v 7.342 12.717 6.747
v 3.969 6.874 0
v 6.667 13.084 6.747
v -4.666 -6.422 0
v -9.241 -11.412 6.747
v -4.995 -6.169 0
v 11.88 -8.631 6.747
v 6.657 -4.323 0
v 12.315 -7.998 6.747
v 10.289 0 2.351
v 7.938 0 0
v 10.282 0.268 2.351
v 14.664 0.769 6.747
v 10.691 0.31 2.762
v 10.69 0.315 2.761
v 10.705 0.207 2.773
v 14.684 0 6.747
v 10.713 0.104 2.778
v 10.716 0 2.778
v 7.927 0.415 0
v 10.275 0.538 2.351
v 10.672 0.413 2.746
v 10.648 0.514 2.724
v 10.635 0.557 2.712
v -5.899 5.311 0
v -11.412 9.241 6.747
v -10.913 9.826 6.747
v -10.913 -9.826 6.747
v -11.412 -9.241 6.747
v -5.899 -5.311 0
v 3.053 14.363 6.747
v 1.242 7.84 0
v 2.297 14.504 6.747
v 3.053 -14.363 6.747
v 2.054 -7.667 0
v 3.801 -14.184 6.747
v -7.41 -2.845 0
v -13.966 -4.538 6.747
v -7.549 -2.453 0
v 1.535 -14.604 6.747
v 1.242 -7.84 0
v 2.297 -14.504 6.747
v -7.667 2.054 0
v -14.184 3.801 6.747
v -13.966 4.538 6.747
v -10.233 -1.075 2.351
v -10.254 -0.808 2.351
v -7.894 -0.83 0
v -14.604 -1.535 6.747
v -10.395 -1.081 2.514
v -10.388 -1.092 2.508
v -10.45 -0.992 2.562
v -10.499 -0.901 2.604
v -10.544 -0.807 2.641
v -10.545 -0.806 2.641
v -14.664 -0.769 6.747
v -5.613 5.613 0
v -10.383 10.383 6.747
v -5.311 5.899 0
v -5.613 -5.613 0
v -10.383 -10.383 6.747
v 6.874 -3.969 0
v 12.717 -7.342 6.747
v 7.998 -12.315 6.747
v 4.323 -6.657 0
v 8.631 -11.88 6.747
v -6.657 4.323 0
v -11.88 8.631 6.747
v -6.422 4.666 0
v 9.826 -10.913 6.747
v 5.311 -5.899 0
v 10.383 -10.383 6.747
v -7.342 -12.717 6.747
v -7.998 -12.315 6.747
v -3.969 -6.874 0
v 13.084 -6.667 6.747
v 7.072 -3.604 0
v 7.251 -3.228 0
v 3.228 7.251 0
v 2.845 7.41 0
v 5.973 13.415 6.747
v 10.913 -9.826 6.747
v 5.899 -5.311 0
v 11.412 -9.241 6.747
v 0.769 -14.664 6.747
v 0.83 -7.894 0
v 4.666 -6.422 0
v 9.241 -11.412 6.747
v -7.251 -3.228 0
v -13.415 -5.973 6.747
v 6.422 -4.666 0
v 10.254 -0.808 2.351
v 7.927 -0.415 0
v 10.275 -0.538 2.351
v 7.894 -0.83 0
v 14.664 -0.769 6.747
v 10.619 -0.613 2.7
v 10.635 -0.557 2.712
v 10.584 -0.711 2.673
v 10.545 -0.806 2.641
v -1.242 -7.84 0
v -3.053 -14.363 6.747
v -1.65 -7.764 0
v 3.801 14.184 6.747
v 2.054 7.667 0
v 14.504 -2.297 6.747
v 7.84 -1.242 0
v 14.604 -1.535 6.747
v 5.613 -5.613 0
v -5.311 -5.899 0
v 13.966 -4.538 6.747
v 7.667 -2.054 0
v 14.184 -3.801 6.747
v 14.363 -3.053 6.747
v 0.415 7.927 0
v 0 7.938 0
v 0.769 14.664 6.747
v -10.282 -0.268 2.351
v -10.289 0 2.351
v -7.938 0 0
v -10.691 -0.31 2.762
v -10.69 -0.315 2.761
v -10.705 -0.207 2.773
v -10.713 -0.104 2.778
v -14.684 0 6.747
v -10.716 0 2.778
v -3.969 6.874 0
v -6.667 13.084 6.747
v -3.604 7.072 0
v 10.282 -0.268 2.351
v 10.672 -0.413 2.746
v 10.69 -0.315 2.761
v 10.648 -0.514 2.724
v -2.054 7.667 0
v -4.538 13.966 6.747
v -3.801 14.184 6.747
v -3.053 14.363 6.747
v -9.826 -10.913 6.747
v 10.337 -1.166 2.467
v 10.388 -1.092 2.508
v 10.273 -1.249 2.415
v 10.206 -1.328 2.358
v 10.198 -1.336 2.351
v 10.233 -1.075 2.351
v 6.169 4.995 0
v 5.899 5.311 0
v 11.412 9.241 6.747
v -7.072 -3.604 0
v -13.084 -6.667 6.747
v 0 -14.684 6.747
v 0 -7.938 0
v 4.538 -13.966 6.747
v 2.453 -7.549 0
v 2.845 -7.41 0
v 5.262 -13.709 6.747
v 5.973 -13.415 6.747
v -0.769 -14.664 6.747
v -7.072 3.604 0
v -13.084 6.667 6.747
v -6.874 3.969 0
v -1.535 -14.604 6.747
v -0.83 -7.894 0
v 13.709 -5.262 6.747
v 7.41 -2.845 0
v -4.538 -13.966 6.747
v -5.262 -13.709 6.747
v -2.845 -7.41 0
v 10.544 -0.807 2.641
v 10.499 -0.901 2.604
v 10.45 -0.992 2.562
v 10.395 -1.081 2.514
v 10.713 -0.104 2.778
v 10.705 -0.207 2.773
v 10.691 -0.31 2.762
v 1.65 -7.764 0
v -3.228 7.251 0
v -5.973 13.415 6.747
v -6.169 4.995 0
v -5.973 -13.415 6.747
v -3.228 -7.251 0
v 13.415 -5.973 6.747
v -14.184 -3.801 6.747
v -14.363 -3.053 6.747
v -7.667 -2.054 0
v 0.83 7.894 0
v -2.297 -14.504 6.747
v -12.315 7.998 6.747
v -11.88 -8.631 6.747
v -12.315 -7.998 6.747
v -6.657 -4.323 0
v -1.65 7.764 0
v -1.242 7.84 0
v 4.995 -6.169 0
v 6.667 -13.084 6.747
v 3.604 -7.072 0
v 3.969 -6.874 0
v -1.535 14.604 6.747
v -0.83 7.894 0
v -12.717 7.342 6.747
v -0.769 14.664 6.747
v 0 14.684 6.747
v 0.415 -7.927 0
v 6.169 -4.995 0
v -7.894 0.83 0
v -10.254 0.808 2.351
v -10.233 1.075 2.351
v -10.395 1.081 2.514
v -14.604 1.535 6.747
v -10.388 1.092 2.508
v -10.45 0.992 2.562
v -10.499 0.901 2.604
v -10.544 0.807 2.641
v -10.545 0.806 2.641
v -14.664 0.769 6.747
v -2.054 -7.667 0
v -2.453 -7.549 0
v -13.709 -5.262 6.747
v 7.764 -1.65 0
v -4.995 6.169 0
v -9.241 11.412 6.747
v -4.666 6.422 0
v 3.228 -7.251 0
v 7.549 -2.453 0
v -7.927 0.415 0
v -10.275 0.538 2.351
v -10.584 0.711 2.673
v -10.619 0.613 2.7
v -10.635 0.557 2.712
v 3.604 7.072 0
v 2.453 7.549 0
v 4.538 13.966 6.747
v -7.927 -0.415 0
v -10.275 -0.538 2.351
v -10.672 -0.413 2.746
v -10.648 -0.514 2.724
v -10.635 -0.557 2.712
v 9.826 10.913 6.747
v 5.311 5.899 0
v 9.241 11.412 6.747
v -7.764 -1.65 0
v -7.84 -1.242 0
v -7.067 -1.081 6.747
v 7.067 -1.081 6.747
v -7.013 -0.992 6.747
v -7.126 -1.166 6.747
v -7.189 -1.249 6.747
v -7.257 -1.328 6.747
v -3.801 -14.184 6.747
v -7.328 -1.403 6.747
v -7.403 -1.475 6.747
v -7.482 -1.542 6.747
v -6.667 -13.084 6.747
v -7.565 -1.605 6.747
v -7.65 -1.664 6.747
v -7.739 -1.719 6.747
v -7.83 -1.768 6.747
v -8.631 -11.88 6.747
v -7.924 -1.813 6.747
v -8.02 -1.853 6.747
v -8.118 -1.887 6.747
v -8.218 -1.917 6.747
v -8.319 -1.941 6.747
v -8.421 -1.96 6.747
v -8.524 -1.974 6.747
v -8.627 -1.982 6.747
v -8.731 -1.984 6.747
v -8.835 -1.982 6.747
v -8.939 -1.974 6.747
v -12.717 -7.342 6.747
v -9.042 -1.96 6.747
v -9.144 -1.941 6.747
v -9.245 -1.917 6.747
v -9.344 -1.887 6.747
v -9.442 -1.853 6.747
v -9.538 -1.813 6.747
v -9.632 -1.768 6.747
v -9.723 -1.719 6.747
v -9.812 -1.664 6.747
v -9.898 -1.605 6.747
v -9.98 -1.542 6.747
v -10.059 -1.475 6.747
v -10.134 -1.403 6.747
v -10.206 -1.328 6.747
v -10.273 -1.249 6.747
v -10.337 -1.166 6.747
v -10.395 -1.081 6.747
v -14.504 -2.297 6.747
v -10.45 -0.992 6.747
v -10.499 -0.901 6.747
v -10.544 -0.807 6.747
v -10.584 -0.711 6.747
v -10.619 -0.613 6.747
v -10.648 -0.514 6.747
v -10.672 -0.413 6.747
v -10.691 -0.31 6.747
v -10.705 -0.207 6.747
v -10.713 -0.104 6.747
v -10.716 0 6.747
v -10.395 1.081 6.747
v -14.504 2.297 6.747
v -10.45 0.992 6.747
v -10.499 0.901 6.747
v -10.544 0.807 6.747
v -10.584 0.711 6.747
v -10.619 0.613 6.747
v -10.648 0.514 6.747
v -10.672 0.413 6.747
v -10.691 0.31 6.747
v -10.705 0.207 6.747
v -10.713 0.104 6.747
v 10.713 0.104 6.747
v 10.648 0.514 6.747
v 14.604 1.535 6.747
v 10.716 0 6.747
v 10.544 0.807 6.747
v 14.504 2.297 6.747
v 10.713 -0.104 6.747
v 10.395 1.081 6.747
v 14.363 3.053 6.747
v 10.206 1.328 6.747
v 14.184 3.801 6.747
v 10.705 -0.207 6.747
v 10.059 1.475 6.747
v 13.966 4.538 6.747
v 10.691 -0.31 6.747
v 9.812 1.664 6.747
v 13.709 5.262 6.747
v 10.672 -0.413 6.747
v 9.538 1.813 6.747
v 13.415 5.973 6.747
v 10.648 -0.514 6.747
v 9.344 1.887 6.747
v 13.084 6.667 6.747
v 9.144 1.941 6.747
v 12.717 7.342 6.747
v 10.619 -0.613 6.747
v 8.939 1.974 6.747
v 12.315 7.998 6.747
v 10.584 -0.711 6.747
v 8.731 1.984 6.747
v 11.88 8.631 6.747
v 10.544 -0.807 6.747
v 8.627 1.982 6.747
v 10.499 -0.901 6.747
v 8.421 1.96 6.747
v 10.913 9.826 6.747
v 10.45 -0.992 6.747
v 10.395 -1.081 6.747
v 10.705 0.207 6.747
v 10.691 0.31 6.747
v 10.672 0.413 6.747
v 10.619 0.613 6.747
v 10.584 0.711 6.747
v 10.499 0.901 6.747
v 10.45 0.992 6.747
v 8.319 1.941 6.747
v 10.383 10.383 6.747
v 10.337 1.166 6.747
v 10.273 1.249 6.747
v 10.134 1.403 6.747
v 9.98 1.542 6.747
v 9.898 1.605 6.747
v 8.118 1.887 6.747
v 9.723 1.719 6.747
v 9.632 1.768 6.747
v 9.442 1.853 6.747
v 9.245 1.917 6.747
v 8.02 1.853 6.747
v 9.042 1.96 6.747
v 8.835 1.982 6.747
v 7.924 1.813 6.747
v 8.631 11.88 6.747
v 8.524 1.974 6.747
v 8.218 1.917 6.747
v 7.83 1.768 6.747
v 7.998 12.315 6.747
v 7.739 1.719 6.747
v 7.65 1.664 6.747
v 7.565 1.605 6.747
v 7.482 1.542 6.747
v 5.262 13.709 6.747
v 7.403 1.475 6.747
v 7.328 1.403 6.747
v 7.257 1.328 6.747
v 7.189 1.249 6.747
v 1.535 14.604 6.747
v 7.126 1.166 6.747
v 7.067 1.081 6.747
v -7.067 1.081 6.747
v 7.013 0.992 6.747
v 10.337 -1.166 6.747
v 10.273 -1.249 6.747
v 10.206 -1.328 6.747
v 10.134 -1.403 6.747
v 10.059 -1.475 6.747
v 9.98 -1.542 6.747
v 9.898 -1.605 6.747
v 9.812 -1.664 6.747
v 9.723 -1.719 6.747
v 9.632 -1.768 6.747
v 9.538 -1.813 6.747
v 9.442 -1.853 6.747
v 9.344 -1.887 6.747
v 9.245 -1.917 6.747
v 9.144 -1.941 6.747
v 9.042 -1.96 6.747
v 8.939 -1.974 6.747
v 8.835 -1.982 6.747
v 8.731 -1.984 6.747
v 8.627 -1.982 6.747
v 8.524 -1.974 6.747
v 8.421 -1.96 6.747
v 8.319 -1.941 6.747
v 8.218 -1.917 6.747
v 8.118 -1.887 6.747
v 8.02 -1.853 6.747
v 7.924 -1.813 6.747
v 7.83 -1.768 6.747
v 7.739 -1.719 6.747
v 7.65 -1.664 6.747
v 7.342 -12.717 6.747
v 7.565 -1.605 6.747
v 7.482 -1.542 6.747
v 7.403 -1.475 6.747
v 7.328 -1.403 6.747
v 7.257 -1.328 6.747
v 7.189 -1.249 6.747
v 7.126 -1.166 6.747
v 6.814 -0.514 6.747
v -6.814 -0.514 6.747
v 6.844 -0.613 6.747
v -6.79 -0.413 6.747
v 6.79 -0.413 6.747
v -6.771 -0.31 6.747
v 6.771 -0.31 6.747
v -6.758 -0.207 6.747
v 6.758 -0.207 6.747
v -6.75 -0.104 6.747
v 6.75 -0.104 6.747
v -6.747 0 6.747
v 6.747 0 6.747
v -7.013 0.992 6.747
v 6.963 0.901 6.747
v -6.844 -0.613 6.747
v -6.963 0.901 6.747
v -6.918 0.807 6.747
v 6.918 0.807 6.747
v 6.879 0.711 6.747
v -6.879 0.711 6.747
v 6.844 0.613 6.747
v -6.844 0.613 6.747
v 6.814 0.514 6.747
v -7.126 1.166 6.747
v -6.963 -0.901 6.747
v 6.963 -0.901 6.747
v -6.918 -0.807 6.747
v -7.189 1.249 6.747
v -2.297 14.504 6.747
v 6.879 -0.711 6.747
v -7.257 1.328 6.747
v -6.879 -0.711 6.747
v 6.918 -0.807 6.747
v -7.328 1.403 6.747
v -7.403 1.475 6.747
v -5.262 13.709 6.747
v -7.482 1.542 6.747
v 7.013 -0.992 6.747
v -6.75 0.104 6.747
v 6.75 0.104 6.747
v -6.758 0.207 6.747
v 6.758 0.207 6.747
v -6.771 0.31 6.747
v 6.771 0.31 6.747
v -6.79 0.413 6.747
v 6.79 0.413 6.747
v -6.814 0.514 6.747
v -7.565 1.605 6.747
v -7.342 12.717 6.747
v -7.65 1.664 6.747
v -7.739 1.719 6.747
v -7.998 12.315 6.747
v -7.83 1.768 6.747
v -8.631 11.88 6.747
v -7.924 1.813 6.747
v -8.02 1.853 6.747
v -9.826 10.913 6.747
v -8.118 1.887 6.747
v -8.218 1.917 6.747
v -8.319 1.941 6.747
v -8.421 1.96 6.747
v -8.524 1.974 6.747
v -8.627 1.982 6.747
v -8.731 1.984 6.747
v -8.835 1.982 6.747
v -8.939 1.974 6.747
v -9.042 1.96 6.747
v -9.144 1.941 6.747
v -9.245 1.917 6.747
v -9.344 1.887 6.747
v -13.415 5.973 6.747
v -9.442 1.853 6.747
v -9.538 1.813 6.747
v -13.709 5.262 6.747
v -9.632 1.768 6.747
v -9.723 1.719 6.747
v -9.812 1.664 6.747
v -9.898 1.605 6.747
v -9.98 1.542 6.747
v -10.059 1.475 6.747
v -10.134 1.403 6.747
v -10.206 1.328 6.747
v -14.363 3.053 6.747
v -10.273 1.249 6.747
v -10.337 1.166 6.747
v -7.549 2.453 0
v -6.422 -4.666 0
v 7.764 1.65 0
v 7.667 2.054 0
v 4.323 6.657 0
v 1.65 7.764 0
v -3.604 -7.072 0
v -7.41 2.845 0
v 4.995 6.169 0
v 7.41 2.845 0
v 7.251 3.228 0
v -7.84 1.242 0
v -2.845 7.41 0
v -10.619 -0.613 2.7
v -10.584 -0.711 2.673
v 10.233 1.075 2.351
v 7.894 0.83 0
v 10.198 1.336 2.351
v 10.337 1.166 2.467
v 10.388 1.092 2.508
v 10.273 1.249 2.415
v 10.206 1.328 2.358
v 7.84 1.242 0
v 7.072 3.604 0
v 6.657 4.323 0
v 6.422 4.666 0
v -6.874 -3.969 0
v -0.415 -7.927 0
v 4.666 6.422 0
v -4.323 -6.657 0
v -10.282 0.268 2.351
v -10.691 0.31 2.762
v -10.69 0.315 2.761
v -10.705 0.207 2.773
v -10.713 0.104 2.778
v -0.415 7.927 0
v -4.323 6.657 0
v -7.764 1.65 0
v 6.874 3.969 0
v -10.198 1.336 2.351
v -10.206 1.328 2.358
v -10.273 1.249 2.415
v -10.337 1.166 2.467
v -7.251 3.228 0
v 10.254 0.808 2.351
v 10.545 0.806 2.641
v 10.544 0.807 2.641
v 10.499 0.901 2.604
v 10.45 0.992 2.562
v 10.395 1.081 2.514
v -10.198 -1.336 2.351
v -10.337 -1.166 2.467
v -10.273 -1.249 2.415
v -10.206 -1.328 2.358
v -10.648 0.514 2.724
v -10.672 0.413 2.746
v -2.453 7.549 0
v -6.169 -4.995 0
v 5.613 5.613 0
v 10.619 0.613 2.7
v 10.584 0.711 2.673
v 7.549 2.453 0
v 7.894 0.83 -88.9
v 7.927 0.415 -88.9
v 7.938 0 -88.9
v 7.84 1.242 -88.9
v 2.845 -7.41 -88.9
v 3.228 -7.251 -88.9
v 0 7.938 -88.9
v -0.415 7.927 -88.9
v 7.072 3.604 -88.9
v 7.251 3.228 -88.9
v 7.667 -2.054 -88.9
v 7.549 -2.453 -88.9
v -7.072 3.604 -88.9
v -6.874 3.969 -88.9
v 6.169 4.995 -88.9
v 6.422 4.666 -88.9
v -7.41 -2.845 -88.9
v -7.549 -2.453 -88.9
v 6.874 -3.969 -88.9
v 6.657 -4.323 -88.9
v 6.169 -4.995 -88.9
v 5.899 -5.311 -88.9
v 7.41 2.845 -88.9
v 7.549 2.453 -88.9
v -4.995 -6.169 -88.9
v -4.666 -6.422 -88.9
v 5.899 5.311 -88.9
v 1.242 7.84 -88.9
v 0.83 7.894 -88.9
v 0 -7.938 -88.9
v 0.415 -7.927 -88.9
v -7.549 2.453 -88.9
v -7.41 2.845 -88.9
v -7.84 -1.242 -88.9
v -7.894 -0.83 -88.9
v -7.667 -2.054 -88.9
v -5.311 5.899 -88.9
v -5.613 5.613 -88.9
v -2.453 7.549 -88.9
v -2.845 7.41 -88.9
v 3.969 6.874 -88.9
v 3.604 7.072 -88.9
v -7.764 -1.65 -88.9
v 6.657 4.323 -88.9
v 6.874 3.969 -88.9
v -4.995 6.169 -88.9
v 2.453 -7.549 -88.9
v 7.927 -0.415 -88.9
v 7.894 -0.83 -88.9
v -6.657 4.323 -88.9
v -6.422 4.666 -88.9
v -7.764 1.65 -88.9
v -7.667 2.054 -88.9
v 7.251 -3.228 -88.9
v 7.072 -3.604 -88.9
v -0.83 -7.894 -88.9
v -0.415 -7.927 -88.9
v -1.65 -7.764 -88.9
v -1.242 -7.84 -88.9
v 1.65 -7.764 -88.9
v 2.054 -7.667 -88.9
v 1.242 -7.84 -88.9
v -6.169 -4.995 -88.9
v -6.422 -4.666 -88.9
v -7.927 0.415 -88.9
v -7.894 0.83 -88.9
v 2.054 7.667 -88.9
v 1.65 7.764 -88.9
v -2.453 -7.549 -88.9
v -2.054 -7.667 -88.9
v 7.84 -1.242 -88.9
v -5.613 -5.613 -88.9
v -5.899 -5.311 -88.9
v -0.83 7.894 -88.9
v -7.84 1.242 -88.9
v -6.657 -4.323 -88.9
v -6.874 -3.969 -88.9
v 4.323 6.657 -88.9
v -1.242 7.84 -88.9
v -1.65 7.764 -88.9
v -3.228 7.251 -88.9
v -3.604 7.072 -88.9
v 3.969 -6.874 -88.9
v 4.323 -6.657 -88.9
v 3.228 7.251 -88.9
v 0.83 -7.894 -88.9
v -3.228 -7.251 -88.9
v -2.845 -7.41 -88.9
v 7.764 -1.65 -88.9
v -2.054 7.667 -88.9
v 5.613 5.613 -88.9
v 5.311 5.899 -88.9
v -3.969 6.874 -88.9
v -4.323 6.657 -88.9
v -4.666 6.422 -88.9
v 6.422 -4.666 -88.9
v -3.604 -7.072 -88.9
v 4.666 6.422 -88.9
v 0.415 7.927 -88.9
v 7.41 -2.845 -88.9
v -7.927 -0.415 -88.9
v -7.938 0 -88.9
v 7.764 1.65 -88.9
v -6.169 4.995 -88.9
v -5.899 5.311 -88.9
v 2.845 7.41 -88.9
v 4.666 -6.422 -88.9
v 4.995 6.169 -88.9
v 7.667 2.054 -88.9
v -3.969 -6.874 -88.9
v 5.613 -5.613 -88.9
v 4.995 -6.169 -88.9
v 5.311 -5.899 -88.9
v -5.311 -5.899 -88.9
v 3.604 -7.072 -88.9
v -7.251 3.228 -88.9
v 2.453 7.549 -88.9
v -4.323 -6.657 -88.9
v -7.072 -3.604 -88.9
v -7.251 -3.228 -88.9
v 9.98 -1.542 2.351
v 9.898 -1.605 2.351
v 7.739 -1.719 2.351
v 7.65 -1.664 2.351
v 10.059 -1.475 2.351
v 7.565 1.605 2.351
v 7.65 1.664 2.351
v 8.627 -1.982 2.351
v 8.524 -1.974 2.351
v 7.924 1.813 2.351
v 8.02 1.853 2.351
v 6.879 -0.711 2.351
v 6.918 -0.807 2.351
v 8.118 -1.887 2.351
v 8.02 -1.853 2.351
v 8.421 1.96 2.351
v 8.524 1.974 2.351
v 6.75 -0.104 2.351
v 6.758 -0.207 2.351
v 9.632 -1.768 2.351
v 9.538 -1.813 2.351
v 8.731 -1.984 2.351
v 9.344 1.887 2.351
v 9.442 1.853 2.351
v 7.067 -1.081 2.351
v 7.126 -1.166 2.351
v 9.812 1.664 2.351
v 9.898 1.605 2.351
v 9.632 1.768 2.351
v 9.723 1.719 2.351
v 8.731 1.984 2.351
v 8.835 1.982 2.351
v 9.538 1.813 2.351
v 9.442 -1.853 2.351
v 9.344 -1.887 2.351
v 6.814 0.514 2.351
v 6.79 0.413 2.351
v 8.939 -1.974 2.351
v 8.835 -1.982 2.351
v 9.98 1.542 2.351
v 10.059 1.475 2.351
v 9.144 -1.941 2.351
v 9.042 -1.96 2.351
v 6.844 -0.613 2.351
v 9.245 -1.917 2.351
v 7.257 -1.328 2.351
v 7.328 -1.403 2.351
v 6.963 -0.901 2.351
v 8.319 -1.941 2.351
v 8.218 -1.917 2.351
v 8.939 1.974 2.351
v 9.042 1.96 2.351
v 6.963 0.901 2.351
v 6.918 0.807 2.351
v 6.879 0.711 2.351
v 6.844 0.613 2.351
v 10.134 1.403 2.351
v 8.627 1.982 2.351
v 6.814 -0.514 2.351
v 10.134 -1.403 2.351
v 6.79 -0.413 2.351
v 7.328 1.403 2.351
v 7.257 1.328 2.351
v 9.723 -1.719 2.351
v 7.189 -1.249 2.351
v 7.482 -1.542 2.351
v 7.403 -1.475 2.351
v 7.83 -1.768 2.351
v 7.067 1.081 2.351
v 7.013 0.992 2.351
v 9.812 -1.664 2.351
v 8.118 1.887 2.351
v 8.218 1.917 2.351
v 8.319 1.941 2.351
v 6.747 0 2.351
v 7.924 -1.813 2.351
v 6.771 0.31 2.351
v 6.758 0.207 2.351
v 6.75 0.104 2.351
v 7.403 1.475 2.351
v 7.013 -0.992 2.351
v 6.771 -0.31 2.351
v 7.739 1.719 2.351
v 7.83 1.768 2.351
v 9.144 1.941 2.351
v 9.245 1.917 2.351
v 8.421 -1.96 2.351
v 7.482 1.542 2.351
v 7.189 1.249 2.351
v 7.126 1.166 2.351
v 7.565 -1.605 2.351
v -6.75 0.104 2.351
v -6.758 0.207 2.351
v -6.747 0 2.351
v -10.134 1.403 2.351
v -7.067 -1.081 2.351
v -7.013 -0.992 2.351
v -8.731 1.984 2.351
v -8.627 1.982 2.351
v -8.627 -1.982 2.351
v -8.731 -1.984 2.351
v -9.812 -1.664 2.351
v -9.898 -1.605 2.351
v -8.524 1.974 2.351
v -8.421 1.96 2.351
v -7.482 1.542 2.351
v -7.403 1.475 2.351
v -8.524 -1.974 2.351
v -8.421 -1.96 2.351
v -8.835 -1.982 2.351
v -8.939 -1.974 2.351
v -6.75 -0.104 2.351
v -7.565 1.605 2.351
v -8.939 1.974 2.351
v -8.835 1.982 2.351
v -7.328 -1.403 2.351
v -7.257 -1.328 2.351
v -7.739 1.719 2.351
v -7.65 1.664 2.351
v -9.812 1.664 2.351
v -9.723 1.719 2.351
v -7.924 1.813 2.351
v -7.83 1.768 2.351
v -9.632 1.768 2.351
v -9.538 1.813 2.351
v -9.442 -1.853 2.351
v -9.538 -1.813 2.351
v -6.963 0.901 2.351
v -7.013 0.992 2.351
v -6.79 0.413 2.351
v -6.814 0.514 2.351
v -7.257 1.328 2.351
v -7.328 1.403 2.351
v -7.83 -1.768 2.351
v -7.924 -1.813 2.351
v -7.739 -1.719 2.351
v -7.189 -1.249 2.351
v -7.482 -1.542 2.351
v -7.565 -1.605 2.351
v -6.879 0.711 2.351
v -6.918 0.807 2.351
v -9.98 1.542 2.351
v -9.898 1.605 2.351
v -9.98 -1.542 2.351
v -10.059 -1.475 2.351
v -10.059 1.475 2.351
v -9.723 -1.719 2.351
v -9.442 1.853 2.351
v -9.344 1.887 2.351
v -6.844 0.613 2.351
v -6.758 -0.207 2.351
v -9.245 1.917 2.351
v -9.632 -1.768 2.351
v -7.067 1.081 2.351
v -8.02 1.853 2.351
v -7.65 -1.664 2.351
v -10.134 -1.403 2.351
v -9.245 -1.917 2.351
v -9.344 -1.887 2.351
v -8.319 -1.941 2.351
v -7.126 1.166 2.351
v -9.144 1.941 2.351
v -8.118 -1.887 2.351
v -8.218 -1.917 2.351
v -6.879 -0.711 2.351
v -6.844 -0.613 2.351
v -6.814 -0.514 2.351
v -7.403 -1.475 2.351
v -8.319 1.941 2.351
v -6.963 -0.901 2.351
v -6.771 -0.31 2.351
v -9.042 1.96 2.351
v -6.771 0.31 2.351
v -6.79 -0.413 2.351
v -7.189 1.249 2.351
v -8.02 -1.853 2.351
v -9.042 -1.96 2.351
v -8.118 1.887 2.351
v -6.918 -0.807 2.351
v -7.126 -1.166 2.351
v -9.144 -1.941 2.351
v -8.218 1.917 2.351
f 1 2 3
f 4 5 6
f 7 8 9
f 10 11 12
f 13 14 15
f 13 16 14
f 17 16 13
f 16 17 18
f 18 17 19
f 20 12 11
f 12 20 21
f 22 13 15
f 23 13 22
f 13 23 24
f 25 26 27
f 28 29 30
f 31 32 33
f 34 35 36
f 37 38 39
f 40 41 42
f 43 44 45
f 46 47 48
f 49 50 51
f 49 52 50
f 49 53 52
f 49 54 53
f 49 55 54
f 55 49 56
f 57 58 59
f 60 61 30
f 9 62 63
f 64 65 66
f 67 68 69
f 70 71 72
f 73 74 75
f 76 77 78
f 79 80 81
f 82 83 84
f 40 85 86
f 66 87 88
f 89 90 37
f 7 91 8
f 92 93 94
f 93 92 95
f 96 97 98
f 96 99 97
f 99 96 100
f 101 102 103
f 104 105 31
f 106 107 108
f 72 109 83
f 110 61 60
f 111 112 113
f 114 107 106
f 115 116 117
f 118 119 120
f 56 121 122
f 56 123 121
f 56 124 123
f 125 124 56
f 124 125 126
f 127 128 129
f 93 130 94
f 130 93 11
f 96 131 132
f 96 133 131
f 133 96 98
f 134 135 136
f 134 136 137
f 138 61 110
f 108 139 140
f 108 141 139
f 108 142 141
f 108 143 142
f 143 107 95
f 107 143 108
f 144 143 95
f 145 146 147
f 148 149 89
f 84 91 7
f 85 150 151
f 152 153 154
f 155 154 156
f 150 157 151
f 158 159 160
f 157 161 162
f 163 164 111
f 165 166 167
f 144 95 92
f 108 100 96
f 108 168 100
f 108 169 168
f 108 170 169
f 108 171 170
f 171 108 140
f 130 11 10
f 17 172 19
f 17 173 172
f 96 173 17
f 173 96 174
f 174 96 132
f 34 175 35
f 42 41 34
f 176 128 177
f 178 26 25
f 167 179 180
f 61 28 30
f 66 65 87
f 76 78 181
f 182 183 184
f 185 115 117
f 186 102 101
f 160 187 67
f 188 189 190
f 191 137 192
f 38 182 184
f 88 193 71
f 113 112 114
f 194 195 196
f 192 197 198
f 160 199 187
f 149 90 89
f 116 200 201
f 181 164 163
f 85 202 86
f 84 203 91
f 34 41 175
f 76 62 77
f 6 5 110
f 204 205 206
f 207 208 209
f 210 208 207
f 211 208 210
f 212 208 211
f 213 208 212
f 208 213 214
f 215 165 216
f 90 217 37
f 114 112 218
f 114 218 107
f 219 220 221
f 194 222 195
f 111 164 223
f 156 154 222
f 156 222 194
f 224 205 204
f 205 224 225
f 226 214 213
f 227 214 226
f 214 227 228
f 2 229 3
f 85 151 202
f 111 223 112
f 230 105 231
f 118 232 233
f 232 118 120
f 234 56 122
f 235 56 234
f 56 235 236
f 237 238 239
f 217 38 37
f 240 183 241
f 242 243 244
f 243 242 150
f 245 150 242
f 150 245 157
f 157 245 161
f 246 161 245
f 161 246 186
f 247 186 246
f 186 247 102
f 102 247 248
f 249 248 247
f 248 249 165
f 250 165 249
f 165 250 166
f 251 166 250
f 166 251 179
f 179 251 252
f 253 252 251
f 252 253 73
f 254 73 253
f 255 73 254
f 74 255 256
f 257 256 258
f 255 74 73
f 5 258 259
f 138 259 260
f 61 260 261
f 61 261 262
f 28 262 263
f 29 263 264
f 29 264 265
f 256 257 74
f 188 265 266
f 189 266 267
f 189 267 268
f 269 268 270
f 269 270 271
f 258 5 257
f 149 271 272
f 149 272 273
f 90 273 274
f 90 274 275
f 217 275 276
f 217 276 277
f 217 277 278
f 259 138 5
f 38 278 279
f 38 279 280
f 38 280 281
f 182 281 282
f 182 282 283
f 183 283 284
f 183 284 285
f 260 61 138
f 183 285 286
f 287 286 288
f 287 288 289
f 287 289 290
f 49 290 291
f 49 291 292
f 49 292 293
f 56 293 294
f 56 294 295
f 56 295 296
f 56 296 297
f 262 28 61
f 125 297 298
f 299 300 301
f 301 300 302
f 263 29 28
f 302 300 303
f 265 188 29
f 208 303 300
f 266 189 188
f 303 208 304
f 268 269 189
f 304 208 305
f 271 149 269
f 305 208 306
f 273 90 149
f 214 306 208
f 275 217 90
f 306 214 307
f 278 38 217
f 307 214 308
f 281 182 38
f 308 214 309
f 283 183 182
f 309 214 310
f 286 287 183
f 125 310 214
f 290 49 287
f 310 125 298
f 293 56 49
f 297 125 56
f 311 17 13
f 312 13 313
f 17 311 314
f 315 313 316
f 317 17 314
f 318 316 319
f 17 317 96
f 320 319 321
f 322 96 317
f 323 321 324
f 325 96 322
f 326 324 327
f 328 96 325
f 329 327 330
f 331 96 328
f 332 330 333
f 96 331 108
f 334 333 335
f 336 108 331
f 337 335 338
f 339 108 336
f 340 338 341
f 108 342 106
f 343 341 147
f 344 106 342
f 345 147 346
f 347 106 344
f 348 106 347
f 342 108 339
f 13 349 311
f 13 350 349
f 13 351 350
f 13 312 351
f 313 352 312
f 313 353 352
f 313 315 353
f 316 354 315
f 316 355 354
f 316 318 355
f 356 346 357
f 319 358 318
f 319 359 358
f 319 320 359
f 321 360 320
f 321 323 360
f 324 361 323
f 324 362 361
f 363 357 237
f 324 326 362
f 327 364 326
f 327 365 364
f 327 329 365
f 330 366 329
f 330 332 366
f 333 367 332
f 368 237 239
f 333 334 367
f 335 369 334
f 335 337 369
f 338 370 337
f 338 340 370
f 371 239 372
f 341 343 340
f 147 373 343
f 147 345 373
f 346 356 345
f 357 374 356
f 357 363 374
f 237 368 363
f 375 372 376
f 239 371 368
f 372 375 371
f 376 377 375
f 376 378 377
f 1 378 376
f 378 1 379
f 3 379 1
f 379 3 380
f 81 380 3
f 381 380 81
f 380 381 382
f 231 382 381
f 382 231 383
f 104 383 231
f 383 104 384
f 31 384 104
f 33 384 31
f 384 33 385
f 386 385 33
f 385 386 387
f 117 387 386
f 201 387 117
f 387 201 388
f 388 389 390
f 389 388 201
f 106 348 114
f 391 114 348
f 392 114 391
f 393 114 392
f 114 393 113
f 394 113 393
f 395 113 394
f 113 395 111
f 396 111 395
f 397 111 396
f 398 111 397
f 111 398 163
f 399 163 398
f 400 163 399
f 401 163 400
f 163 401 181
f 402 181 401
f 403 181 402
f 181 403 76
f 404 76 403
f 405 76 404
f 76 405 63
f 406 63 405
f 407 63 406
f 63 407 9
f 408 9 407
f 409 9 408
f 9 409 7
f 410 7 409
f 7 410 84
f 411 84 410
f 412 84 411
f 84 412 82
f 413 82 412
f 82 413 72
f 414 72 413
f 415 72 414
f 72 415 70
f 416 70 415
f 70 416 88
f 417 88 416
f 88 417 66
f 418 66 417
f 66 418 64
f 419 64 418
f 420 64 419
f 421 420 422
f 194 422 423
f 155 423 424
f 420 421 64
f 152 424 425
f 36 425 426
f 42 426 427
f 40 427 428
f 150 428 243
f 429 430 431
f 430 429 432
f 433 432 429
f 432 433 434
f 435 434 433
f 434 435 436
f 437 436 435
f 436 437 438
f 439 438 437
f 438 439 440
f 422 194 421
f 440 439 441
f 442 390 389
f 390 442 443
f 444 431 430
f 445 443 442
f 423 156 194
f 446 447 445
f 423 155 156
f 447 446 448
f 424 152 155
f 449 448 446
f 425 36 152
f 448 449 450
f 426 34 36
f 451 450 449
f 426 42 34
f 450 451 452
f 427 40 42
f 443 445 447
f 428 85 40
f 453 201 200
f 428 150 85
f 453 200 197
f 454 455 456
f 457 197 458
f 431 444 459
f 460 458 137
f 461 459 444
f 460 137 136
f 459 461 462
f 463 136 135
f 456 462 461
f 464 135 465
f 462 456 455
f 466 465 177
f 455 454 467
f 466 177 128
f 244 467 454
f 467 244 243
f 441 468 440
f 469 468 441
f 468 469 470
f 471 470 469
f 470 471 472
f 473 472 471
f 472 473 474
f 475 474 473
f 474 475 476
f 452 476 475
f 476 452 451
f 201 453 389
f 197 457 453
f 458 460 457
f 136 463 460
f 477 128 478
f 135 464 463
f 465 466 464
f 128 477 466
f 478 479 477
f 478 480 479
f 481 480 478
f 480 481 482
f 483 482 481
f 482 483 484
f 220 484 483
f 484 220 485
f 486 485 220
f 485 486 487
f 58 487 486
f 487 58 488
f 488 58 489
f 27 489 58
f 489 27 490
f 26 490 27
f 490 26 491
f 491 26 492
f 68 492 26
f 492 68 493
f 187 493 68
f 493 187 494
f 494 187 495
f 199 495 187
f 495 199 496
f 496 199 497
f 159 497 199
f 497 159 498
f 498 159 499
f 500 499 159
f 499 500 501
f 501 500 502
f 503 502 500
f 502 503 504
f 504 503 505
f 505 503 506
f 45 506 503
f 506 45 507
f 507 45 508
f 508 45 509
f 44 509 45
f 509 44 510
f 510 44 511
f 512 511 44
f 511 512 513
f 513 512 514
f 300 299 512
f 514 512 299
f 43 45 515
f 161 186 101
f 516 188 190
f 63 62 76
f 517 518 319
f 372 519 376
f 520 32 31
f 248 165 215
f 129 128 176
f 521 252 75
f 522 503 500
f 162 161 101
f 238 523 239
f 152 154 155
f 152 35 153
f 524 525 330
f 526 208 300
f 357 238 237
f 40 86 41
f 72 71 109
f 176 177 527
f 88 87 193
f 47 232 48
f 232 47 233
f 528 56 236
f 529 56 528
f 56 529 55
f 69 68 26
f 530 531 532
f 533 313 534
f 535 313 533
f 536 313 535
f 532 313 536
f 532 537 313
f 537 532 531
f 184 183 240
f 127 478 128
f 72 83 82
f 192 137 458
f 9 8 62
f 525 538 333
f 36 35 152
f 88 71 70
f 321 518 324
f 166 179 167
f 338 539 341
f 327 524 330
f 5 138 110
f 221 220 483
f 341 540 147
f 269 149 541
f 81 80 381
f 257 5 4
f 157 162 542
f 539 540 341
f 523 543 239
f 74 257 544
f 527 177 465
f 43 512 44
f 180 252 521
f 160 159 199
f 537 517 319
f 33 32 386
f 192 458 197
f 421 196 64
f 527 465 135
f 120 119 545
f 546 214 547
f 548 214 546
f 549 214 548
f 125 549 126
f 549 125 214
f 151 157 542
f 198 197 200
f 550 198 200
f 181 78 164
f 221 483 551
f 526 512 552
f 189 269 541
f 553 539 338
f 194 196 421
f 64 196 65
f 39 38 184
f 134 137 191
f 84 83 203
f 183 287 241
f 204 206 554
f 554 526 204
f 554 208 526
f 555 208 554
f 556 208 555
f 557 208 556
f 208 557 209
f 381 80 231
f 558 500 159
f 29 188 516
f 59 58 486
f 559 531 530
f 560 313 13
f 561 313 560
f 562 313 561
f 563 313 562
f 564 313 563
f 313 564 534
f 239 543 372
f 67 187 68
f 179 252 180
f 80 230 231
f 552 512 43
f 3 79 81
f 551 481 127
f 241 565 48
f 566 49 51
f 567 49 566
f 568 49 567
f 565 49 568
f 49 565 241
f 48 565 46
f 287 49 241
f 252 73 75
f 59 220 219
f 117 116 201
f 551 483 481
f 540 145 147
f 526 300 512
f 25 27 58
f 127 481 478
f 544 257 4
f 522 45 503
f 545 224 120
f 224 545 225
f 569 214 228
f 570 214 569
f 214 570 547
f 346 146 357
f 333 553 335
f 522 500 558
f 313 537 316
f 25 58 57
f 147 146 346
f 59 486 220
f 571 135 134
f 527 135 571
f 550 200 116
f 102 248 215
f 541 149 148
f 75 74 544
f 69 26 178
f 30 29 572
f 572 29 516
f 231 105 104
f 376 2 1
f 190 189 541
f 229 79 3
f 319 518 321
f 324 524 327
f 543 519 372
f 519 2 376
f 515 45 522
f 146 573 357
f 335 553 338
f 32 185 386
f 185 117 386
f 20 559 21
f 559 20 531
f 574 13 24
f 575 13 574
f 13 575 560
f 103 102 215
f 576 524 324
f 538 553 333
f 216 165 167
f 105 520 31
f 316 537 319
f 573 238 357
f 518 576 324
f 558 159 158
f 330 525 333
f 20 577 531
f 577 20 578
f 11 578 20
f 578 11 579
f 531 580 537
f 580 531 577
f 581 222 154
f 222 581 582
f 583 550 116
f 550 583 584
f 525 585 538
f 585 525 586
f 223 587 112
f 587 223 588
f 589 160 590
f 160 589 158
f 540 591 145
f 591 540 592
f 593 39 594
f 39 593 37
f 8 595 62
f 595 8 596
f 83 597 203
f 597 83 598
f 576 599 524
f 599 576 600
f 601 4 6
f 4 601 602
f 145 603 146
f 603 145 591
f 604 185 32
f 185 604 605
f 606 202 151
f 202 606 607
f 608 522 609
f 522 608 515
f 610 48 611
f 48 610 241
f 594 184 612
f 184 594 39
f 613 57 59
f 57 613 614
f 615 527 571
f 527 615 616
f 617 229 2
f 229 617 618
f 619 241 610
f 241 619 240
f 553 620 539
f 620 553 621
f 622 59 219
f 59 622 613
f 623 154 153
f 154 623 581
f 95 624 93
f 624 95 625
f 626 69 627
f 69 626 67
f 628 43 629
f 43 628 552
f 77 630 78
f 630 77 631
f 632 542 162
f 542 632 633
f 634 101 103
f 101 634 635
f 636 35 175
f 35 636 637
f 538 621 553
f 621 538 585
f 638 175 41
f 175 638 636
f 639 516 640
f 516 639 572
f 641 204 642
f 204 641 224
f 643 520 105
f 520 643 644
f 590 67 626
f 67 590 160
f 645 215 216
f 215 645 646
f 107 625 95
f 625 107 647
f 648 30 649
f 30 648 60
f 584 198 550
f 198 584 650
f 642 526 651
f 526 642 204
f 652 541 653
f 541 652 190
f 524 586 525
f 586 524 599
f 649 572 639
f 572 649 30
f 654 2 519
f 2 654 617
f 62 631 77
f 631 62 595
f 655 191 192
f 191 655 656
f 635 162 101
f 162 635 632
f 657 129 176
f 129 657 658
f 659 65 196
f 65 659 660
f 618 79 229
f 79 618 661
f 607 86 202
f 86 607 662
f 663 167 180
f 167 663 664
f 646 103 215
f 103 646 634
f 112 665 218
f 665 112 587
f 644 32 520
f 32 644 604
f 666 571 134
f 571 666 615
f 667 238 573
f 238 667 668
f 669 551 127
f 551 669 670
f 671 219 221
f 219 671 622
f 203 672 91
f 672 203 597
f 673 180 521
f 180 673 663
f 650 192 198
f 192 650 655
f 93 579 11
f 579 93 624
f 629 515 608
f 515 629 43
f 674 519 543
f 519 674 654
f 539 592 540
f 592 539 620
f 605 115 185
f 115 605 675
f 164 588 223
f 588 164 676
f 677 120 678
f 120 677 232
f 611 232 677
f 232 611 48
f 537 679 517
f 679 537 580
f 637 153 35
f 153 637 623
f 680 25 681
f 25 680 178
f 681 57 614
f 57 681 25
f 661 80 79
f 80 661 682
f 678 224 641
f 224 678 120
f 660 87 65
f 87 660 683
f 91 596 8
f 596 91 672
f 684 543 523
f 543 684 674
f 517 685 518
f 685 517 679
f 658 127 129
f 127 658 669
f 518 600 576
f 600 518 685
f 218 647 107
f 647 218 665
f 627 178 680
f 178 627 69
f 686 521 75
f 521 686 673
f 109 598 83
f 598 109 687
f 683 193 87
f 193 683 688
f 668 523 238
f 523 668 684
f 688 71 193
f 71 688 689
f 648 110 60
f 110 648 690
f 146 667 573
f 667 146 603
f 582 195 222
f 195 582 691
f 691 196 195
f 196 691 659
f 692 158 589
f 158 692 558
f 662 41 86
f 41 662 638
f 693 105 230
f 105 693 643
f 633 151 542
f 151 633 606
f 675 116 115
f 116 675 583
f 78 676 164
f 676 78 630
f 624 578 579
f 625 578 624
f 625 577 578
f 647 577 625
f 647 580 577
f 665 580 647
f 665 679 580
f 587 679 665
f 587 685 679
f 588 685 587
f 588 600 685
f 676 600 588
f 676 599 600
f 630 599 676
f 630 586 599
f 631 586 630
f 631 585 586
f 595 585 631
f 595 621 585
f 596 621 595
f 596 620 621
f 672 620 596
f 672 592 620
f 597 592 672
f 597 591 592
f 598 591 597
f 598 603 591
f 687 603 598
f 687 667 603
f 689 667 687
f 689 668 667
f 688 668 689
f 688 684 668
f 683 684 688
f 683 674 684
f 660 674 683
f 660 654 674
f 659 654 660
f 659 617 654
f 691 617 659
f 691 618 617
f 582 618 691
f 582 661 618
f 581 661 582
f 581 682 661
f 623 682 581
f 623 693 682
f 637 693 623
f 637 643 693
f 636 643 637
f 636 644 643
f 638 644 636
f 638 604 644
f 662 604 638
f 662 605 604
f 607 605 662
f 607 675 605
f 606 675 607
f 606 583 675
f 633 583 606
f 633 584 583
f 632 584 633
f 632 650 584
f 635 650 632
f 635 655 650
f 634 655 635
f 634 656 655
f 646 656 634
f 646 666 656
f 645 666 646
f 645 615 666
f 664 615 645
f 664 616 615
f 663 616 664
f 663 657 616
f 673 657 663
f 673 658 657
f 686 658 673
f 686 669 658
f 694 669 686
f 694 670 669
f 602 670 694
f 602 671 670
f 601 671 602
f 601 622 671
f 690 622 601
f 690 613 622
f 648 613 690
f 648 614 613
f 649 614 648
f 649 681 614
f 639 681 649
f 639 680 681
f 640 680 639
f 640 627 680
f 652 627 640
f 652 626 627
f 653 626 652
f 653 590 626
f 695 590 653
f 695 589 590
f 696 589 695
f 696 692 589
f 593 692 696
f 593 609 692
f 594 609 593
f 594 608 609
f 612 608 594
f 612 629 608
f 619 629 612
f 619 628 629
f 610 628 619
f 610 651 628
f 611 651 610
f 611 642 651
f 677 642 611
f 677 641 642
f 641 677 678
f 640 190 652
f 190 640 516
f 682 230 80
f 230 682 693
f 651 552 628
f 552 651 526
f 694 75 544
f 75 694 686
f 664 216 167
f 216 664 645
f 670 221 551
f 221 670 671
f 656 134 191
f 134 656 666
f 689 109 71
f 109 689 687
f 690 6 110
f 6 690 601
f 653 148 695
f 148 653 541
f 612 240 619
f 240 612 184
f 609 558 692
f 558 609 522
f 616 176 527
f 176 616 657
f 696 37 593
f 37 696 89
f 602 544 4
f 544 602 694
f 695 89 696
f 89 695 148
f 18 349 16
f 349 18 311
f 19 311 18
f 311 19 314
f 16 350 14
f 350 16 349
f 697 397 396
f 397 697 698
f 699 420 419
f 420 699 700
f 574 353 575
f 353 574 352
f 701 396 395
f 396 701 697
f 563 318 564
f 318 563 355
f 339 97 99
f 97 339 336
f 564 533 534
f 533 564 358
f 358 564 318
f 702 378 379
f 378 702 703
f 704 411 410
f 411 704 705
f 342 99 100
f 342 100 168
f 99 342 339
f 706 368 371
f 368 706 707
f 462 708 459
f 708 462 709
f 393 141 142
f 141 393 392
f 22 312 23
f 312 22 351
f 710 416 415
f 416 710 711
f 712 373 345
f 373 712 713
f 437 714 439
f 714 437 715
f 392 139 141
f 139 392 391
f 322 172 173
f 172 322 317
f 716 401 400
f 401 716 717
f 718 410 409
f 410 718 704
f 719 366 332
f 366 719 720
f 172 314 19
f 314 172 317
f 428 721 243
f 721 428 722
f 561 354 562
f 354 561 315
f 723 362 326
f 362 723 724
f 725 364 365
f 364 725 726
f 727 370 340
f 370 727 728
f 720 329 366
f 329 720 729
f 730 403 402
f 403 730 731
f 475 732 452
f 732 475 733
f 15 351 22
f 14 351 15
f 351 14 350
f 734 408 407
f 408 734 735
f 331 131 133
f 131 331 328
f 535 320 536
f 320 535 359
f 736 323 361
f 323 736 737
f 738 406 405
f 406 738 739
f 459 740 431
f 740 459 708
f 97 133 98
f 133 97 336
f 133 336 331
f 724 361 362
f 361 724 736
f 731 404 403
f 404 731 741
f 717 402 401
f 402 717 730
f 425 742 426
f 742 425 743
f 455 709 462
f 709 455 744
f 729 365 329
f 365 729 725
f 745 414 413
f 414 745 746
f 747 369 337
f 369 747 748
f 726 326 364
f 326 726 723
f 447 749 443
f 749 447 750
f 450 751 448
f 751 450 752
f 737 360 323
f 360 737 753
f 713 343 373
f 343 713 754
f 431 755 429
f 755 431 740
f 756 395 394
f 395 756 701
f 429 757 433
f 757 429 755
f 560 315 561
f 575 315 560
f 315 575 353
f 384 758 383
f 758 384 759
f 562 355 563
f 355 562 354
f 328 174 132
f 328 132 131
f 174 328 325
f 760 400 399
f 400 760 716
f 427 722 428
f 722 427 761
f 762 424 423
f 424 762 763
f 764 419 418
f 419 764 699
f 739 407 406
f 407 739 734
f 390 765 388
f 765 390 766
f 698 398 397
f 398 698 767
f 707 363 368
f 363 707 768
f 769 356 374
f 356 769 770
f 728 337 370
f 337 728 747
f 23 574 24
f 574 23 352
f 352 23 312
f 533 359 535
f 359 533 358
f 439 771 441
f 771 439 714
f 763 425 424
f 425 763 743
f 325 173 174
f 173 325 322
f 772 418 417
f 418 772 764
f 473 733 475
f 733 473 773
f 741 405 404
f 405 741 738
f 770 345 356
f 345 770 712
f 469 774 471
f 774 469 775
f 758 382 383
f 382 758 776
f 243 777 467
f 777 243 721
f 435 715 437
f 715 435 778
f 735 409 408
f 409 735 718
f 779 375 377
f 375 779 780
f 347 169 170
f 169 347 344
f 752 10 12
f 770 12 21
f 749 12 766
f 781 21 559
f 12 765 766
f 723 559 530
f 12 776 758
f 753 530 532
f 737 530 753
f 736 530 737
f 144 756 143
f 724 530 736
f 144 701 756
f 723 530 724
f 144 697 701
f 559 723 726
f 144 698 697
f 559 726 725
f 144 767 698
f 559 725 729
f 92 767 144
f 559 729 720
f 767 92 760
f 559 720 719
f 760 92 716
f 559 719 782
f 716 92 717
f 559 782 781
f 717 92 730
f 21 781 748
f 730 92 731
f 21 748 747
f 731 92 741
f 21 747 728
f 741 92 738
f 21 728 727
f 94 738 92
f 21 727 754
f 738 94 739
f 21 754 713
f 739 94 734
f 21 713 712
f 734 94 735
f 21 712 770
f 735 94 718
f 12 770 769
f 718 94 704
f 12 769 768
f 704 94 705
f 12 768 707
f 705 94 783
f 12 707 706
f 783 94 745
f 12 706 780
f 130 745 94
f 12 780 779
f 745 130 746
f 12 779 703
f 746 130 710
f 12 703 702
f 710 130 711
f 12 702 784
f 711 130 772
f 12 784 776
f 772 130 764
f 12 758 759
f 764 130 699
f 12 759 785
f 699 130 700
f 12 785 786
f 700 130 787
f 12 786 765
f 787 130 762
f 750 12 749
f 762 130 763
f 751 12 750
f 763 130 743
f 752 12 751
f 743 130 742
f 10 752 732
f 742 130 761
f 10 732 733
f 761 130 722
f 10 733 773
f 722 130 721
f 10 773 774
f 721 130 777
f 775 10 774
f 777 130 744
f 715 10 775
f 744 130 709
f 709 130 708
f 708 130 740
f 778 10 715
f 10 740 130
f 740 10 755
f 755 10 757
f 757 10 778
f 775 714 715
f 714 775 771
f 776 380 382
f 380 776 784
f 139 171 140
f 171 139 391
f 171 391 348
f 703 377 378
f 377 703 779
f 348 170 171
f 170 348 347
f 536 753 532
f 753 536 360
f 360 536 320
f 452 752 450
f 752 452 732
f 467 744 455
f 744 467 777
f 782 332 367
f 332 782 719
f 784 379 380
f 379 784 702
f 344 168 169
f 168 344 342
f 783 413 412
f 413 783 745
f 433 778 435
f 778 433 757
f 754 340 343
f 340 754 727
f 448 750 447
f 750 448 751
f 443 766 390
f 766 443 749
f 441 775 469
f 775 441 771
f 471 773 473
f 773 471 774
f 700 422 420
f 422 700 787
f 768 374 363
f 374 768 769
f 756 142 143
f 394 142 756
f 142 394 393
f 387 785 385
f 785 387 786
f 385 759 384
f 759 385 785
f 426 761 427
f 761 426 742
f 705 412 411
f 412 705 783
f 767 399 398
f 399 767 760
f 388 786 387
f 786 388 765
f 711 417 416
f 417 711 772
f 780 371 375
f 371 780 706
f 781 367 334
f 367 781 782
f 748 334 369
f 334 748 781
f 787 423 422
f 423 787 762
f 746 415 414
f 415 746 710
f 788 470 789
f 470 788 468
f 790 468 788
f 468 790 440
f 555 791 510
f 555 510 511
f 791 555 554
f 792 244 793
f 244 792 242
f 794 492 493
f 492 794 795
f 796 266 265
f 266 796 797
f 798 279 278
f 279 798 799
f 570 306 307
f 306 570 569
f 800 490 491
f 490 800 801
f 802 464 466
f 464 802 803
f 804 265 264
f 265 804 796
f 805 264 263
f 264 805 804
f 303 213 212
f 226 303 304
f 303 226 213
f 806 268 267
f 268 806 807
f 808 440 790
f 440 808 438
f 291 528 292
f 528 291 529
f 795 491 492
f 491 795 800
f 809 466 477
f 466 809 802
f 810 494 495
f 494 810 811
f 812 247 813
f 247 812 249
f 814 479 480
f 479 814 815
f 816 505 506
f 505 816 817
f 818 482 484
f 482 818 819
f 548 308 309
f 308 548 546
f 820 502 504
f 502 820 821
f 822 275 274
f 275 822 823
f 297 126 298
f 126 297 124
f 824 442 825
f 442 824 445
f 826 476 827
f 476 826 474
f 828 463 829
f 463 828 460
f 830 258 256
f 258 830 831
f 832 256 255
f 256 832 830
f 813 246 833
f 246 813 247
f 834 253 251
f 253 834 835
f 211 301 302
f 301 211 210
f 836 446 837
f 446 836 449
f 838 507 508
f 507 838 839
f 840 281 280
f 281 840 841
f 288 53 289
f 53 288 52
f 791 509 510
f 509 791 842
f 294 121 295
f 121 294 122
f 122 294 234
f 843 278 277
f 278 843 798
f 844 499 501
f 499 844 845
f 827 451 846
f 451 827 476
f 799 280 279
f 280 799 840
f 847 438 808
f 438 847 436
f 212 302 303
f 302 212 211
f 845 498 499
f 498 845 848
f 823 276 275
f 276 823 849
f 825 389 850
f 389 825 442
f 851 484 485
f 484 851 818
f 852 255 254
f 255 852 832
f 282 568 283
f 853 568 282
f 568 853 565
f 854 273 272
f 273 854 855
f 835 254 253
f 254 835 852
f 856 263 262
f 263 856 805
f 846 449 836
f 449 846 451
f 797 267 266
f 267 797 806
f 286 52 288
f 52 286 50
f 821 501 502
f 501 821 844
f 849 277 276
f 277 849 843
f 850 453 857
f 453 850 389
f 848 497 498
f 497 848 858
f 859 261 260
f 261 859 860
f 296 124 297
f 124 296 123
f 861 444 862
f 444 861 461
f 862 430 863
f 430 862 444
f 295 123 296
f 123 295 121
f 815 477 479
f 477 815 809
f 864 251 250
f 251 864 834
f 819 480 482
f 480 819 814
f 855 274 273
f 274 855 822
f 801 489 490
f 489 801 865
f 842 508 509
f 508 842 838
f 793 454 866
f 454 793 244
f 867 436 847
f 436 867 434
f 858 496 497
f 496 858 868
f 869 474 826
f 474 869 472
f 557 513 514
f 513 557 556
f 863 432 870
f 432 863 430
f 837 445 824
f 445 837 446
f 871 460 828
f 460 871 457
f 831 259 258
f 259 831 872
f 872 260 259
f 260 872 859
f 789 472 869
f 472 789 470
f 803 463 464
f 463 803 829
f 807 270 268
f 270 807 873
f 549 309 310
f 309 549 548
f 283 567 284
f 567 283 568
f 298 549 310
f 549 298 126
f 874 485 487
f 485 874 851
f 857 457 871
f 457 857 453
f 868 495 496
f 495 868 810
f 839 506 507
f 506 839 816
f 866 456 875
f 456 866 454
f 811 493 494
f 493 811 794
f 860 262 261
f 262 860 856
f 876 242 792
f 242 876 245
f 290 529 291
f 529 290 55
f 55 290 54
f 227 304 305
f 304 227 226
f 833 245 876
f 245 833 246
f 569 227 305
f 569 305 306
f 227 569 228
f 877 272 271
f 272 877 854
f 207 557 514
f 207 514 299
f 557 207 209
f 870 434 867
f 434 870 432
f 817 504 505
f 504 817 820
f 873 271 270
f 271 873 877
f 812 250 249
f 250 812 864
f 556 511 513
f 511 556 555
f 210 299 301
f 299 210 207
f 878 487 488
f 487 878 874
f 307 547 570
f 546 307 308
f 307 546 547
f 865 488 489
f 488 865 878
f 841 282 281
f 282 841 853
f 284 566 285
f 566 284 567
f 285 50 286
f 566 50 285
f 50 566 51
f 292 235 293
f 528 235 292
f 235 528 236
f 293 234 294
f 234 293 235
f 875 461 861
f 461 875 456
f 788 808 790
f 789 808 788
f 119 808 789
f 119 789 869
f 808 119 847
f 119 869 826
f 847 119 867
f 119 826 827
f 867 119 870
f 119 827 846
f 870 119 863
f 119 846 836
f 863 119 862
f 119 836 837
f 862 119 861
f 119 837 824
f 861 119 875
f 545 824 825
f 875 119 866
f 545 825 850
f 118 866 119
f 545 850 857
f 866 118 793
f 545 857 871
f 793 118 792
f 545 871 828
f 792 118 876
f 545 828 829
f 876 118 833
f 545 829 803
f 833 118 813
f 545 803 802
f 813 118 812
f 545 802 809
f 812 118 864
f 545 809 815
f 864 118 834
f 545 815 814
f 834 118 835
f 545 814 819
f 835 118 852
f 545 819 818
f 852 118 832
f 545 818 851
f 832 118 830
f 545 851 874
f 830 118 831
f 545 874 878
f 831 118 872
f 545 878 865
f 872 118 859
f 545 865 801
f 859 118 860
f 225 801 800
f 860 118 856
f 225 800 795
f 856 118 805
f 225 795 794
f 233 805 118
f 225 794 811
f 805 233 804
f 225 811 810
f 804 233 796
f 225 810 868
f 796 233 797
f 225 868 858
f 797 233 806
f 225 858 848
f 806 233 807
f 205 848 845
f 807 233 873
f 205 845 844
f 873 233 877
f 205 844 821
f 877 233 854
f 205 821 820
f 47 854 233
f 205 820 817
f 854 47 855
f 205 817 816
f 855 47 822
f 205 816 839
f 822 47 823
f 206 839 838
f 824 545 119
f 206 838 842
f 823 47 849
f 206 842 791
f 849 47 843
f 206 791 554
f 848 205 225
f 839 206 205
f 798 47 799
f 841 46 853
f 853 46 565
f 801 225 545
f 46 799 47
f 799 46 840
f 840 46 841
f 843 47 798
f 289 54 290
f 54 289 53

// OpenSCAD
// =================================================================
// FLAT COUNTERSUNK SECURITY SPANNER BOLT GENERATOR
// Eliminates tripping hazards and snowplow damage for roadways
// =================================================================

$fn = 120; // High resolution rendering

/* [Select Size Preset] */
bolt_preset = "5/8-11"; // [ "5/8-11", "1/2-13", "3/8-16" ]

function get_nominal_dia(p) = (p=="5/8-11") ? 15.875 : (p=="1/2-13") ? 12.7 : 9.525;
function get_nominal_len(p) = (p=="5/8-11") ? 88.9 : (p=="1/2-13") ? 63.5 : 38.1;

d_nominal = get_nominal_dia(bolt_preset);
l_nominal = get_nominal_len(bolt_preset);

// Standard 82-degree countersink head dimensions
head_dia    = d_nominal * 1.85; 
head_ht     = (head_dia - d_nominal) / 2; // Derived height for an 82-degree angle
span_dia    = d_nominal * 0.25;
span_dist   = d_nominal * 1.10;
span_depth  = head_ht * 0.65;

// Output flat-head geometry
difference() {
    union() {
        // Flat countersunk head (82-degree taper cone)
        cylinder(d1=d_nominal, d2=head_dia, h=head_ht);
        
        // Shank extension
        translate([0, 0, -l_nominal])
            cylinder(d=d_nominal, h=l_nominal);
    }
    
    // Flat top surface plane alignment check
    translate([0,0,-0.01]) {
        // Blind Pin Hole 1
        translate([span_dist / 2, 0, head_ht - span_depth])
            cylinder(d=span_dia, h=span_depth + 0.5);
            
        // Blind Pin Hole 2
        translate([-span_dist / 2, 0, head_ht - span_depth])
            cylinder(d=span_dia, h=span_depth + 0.5);
    }
}
